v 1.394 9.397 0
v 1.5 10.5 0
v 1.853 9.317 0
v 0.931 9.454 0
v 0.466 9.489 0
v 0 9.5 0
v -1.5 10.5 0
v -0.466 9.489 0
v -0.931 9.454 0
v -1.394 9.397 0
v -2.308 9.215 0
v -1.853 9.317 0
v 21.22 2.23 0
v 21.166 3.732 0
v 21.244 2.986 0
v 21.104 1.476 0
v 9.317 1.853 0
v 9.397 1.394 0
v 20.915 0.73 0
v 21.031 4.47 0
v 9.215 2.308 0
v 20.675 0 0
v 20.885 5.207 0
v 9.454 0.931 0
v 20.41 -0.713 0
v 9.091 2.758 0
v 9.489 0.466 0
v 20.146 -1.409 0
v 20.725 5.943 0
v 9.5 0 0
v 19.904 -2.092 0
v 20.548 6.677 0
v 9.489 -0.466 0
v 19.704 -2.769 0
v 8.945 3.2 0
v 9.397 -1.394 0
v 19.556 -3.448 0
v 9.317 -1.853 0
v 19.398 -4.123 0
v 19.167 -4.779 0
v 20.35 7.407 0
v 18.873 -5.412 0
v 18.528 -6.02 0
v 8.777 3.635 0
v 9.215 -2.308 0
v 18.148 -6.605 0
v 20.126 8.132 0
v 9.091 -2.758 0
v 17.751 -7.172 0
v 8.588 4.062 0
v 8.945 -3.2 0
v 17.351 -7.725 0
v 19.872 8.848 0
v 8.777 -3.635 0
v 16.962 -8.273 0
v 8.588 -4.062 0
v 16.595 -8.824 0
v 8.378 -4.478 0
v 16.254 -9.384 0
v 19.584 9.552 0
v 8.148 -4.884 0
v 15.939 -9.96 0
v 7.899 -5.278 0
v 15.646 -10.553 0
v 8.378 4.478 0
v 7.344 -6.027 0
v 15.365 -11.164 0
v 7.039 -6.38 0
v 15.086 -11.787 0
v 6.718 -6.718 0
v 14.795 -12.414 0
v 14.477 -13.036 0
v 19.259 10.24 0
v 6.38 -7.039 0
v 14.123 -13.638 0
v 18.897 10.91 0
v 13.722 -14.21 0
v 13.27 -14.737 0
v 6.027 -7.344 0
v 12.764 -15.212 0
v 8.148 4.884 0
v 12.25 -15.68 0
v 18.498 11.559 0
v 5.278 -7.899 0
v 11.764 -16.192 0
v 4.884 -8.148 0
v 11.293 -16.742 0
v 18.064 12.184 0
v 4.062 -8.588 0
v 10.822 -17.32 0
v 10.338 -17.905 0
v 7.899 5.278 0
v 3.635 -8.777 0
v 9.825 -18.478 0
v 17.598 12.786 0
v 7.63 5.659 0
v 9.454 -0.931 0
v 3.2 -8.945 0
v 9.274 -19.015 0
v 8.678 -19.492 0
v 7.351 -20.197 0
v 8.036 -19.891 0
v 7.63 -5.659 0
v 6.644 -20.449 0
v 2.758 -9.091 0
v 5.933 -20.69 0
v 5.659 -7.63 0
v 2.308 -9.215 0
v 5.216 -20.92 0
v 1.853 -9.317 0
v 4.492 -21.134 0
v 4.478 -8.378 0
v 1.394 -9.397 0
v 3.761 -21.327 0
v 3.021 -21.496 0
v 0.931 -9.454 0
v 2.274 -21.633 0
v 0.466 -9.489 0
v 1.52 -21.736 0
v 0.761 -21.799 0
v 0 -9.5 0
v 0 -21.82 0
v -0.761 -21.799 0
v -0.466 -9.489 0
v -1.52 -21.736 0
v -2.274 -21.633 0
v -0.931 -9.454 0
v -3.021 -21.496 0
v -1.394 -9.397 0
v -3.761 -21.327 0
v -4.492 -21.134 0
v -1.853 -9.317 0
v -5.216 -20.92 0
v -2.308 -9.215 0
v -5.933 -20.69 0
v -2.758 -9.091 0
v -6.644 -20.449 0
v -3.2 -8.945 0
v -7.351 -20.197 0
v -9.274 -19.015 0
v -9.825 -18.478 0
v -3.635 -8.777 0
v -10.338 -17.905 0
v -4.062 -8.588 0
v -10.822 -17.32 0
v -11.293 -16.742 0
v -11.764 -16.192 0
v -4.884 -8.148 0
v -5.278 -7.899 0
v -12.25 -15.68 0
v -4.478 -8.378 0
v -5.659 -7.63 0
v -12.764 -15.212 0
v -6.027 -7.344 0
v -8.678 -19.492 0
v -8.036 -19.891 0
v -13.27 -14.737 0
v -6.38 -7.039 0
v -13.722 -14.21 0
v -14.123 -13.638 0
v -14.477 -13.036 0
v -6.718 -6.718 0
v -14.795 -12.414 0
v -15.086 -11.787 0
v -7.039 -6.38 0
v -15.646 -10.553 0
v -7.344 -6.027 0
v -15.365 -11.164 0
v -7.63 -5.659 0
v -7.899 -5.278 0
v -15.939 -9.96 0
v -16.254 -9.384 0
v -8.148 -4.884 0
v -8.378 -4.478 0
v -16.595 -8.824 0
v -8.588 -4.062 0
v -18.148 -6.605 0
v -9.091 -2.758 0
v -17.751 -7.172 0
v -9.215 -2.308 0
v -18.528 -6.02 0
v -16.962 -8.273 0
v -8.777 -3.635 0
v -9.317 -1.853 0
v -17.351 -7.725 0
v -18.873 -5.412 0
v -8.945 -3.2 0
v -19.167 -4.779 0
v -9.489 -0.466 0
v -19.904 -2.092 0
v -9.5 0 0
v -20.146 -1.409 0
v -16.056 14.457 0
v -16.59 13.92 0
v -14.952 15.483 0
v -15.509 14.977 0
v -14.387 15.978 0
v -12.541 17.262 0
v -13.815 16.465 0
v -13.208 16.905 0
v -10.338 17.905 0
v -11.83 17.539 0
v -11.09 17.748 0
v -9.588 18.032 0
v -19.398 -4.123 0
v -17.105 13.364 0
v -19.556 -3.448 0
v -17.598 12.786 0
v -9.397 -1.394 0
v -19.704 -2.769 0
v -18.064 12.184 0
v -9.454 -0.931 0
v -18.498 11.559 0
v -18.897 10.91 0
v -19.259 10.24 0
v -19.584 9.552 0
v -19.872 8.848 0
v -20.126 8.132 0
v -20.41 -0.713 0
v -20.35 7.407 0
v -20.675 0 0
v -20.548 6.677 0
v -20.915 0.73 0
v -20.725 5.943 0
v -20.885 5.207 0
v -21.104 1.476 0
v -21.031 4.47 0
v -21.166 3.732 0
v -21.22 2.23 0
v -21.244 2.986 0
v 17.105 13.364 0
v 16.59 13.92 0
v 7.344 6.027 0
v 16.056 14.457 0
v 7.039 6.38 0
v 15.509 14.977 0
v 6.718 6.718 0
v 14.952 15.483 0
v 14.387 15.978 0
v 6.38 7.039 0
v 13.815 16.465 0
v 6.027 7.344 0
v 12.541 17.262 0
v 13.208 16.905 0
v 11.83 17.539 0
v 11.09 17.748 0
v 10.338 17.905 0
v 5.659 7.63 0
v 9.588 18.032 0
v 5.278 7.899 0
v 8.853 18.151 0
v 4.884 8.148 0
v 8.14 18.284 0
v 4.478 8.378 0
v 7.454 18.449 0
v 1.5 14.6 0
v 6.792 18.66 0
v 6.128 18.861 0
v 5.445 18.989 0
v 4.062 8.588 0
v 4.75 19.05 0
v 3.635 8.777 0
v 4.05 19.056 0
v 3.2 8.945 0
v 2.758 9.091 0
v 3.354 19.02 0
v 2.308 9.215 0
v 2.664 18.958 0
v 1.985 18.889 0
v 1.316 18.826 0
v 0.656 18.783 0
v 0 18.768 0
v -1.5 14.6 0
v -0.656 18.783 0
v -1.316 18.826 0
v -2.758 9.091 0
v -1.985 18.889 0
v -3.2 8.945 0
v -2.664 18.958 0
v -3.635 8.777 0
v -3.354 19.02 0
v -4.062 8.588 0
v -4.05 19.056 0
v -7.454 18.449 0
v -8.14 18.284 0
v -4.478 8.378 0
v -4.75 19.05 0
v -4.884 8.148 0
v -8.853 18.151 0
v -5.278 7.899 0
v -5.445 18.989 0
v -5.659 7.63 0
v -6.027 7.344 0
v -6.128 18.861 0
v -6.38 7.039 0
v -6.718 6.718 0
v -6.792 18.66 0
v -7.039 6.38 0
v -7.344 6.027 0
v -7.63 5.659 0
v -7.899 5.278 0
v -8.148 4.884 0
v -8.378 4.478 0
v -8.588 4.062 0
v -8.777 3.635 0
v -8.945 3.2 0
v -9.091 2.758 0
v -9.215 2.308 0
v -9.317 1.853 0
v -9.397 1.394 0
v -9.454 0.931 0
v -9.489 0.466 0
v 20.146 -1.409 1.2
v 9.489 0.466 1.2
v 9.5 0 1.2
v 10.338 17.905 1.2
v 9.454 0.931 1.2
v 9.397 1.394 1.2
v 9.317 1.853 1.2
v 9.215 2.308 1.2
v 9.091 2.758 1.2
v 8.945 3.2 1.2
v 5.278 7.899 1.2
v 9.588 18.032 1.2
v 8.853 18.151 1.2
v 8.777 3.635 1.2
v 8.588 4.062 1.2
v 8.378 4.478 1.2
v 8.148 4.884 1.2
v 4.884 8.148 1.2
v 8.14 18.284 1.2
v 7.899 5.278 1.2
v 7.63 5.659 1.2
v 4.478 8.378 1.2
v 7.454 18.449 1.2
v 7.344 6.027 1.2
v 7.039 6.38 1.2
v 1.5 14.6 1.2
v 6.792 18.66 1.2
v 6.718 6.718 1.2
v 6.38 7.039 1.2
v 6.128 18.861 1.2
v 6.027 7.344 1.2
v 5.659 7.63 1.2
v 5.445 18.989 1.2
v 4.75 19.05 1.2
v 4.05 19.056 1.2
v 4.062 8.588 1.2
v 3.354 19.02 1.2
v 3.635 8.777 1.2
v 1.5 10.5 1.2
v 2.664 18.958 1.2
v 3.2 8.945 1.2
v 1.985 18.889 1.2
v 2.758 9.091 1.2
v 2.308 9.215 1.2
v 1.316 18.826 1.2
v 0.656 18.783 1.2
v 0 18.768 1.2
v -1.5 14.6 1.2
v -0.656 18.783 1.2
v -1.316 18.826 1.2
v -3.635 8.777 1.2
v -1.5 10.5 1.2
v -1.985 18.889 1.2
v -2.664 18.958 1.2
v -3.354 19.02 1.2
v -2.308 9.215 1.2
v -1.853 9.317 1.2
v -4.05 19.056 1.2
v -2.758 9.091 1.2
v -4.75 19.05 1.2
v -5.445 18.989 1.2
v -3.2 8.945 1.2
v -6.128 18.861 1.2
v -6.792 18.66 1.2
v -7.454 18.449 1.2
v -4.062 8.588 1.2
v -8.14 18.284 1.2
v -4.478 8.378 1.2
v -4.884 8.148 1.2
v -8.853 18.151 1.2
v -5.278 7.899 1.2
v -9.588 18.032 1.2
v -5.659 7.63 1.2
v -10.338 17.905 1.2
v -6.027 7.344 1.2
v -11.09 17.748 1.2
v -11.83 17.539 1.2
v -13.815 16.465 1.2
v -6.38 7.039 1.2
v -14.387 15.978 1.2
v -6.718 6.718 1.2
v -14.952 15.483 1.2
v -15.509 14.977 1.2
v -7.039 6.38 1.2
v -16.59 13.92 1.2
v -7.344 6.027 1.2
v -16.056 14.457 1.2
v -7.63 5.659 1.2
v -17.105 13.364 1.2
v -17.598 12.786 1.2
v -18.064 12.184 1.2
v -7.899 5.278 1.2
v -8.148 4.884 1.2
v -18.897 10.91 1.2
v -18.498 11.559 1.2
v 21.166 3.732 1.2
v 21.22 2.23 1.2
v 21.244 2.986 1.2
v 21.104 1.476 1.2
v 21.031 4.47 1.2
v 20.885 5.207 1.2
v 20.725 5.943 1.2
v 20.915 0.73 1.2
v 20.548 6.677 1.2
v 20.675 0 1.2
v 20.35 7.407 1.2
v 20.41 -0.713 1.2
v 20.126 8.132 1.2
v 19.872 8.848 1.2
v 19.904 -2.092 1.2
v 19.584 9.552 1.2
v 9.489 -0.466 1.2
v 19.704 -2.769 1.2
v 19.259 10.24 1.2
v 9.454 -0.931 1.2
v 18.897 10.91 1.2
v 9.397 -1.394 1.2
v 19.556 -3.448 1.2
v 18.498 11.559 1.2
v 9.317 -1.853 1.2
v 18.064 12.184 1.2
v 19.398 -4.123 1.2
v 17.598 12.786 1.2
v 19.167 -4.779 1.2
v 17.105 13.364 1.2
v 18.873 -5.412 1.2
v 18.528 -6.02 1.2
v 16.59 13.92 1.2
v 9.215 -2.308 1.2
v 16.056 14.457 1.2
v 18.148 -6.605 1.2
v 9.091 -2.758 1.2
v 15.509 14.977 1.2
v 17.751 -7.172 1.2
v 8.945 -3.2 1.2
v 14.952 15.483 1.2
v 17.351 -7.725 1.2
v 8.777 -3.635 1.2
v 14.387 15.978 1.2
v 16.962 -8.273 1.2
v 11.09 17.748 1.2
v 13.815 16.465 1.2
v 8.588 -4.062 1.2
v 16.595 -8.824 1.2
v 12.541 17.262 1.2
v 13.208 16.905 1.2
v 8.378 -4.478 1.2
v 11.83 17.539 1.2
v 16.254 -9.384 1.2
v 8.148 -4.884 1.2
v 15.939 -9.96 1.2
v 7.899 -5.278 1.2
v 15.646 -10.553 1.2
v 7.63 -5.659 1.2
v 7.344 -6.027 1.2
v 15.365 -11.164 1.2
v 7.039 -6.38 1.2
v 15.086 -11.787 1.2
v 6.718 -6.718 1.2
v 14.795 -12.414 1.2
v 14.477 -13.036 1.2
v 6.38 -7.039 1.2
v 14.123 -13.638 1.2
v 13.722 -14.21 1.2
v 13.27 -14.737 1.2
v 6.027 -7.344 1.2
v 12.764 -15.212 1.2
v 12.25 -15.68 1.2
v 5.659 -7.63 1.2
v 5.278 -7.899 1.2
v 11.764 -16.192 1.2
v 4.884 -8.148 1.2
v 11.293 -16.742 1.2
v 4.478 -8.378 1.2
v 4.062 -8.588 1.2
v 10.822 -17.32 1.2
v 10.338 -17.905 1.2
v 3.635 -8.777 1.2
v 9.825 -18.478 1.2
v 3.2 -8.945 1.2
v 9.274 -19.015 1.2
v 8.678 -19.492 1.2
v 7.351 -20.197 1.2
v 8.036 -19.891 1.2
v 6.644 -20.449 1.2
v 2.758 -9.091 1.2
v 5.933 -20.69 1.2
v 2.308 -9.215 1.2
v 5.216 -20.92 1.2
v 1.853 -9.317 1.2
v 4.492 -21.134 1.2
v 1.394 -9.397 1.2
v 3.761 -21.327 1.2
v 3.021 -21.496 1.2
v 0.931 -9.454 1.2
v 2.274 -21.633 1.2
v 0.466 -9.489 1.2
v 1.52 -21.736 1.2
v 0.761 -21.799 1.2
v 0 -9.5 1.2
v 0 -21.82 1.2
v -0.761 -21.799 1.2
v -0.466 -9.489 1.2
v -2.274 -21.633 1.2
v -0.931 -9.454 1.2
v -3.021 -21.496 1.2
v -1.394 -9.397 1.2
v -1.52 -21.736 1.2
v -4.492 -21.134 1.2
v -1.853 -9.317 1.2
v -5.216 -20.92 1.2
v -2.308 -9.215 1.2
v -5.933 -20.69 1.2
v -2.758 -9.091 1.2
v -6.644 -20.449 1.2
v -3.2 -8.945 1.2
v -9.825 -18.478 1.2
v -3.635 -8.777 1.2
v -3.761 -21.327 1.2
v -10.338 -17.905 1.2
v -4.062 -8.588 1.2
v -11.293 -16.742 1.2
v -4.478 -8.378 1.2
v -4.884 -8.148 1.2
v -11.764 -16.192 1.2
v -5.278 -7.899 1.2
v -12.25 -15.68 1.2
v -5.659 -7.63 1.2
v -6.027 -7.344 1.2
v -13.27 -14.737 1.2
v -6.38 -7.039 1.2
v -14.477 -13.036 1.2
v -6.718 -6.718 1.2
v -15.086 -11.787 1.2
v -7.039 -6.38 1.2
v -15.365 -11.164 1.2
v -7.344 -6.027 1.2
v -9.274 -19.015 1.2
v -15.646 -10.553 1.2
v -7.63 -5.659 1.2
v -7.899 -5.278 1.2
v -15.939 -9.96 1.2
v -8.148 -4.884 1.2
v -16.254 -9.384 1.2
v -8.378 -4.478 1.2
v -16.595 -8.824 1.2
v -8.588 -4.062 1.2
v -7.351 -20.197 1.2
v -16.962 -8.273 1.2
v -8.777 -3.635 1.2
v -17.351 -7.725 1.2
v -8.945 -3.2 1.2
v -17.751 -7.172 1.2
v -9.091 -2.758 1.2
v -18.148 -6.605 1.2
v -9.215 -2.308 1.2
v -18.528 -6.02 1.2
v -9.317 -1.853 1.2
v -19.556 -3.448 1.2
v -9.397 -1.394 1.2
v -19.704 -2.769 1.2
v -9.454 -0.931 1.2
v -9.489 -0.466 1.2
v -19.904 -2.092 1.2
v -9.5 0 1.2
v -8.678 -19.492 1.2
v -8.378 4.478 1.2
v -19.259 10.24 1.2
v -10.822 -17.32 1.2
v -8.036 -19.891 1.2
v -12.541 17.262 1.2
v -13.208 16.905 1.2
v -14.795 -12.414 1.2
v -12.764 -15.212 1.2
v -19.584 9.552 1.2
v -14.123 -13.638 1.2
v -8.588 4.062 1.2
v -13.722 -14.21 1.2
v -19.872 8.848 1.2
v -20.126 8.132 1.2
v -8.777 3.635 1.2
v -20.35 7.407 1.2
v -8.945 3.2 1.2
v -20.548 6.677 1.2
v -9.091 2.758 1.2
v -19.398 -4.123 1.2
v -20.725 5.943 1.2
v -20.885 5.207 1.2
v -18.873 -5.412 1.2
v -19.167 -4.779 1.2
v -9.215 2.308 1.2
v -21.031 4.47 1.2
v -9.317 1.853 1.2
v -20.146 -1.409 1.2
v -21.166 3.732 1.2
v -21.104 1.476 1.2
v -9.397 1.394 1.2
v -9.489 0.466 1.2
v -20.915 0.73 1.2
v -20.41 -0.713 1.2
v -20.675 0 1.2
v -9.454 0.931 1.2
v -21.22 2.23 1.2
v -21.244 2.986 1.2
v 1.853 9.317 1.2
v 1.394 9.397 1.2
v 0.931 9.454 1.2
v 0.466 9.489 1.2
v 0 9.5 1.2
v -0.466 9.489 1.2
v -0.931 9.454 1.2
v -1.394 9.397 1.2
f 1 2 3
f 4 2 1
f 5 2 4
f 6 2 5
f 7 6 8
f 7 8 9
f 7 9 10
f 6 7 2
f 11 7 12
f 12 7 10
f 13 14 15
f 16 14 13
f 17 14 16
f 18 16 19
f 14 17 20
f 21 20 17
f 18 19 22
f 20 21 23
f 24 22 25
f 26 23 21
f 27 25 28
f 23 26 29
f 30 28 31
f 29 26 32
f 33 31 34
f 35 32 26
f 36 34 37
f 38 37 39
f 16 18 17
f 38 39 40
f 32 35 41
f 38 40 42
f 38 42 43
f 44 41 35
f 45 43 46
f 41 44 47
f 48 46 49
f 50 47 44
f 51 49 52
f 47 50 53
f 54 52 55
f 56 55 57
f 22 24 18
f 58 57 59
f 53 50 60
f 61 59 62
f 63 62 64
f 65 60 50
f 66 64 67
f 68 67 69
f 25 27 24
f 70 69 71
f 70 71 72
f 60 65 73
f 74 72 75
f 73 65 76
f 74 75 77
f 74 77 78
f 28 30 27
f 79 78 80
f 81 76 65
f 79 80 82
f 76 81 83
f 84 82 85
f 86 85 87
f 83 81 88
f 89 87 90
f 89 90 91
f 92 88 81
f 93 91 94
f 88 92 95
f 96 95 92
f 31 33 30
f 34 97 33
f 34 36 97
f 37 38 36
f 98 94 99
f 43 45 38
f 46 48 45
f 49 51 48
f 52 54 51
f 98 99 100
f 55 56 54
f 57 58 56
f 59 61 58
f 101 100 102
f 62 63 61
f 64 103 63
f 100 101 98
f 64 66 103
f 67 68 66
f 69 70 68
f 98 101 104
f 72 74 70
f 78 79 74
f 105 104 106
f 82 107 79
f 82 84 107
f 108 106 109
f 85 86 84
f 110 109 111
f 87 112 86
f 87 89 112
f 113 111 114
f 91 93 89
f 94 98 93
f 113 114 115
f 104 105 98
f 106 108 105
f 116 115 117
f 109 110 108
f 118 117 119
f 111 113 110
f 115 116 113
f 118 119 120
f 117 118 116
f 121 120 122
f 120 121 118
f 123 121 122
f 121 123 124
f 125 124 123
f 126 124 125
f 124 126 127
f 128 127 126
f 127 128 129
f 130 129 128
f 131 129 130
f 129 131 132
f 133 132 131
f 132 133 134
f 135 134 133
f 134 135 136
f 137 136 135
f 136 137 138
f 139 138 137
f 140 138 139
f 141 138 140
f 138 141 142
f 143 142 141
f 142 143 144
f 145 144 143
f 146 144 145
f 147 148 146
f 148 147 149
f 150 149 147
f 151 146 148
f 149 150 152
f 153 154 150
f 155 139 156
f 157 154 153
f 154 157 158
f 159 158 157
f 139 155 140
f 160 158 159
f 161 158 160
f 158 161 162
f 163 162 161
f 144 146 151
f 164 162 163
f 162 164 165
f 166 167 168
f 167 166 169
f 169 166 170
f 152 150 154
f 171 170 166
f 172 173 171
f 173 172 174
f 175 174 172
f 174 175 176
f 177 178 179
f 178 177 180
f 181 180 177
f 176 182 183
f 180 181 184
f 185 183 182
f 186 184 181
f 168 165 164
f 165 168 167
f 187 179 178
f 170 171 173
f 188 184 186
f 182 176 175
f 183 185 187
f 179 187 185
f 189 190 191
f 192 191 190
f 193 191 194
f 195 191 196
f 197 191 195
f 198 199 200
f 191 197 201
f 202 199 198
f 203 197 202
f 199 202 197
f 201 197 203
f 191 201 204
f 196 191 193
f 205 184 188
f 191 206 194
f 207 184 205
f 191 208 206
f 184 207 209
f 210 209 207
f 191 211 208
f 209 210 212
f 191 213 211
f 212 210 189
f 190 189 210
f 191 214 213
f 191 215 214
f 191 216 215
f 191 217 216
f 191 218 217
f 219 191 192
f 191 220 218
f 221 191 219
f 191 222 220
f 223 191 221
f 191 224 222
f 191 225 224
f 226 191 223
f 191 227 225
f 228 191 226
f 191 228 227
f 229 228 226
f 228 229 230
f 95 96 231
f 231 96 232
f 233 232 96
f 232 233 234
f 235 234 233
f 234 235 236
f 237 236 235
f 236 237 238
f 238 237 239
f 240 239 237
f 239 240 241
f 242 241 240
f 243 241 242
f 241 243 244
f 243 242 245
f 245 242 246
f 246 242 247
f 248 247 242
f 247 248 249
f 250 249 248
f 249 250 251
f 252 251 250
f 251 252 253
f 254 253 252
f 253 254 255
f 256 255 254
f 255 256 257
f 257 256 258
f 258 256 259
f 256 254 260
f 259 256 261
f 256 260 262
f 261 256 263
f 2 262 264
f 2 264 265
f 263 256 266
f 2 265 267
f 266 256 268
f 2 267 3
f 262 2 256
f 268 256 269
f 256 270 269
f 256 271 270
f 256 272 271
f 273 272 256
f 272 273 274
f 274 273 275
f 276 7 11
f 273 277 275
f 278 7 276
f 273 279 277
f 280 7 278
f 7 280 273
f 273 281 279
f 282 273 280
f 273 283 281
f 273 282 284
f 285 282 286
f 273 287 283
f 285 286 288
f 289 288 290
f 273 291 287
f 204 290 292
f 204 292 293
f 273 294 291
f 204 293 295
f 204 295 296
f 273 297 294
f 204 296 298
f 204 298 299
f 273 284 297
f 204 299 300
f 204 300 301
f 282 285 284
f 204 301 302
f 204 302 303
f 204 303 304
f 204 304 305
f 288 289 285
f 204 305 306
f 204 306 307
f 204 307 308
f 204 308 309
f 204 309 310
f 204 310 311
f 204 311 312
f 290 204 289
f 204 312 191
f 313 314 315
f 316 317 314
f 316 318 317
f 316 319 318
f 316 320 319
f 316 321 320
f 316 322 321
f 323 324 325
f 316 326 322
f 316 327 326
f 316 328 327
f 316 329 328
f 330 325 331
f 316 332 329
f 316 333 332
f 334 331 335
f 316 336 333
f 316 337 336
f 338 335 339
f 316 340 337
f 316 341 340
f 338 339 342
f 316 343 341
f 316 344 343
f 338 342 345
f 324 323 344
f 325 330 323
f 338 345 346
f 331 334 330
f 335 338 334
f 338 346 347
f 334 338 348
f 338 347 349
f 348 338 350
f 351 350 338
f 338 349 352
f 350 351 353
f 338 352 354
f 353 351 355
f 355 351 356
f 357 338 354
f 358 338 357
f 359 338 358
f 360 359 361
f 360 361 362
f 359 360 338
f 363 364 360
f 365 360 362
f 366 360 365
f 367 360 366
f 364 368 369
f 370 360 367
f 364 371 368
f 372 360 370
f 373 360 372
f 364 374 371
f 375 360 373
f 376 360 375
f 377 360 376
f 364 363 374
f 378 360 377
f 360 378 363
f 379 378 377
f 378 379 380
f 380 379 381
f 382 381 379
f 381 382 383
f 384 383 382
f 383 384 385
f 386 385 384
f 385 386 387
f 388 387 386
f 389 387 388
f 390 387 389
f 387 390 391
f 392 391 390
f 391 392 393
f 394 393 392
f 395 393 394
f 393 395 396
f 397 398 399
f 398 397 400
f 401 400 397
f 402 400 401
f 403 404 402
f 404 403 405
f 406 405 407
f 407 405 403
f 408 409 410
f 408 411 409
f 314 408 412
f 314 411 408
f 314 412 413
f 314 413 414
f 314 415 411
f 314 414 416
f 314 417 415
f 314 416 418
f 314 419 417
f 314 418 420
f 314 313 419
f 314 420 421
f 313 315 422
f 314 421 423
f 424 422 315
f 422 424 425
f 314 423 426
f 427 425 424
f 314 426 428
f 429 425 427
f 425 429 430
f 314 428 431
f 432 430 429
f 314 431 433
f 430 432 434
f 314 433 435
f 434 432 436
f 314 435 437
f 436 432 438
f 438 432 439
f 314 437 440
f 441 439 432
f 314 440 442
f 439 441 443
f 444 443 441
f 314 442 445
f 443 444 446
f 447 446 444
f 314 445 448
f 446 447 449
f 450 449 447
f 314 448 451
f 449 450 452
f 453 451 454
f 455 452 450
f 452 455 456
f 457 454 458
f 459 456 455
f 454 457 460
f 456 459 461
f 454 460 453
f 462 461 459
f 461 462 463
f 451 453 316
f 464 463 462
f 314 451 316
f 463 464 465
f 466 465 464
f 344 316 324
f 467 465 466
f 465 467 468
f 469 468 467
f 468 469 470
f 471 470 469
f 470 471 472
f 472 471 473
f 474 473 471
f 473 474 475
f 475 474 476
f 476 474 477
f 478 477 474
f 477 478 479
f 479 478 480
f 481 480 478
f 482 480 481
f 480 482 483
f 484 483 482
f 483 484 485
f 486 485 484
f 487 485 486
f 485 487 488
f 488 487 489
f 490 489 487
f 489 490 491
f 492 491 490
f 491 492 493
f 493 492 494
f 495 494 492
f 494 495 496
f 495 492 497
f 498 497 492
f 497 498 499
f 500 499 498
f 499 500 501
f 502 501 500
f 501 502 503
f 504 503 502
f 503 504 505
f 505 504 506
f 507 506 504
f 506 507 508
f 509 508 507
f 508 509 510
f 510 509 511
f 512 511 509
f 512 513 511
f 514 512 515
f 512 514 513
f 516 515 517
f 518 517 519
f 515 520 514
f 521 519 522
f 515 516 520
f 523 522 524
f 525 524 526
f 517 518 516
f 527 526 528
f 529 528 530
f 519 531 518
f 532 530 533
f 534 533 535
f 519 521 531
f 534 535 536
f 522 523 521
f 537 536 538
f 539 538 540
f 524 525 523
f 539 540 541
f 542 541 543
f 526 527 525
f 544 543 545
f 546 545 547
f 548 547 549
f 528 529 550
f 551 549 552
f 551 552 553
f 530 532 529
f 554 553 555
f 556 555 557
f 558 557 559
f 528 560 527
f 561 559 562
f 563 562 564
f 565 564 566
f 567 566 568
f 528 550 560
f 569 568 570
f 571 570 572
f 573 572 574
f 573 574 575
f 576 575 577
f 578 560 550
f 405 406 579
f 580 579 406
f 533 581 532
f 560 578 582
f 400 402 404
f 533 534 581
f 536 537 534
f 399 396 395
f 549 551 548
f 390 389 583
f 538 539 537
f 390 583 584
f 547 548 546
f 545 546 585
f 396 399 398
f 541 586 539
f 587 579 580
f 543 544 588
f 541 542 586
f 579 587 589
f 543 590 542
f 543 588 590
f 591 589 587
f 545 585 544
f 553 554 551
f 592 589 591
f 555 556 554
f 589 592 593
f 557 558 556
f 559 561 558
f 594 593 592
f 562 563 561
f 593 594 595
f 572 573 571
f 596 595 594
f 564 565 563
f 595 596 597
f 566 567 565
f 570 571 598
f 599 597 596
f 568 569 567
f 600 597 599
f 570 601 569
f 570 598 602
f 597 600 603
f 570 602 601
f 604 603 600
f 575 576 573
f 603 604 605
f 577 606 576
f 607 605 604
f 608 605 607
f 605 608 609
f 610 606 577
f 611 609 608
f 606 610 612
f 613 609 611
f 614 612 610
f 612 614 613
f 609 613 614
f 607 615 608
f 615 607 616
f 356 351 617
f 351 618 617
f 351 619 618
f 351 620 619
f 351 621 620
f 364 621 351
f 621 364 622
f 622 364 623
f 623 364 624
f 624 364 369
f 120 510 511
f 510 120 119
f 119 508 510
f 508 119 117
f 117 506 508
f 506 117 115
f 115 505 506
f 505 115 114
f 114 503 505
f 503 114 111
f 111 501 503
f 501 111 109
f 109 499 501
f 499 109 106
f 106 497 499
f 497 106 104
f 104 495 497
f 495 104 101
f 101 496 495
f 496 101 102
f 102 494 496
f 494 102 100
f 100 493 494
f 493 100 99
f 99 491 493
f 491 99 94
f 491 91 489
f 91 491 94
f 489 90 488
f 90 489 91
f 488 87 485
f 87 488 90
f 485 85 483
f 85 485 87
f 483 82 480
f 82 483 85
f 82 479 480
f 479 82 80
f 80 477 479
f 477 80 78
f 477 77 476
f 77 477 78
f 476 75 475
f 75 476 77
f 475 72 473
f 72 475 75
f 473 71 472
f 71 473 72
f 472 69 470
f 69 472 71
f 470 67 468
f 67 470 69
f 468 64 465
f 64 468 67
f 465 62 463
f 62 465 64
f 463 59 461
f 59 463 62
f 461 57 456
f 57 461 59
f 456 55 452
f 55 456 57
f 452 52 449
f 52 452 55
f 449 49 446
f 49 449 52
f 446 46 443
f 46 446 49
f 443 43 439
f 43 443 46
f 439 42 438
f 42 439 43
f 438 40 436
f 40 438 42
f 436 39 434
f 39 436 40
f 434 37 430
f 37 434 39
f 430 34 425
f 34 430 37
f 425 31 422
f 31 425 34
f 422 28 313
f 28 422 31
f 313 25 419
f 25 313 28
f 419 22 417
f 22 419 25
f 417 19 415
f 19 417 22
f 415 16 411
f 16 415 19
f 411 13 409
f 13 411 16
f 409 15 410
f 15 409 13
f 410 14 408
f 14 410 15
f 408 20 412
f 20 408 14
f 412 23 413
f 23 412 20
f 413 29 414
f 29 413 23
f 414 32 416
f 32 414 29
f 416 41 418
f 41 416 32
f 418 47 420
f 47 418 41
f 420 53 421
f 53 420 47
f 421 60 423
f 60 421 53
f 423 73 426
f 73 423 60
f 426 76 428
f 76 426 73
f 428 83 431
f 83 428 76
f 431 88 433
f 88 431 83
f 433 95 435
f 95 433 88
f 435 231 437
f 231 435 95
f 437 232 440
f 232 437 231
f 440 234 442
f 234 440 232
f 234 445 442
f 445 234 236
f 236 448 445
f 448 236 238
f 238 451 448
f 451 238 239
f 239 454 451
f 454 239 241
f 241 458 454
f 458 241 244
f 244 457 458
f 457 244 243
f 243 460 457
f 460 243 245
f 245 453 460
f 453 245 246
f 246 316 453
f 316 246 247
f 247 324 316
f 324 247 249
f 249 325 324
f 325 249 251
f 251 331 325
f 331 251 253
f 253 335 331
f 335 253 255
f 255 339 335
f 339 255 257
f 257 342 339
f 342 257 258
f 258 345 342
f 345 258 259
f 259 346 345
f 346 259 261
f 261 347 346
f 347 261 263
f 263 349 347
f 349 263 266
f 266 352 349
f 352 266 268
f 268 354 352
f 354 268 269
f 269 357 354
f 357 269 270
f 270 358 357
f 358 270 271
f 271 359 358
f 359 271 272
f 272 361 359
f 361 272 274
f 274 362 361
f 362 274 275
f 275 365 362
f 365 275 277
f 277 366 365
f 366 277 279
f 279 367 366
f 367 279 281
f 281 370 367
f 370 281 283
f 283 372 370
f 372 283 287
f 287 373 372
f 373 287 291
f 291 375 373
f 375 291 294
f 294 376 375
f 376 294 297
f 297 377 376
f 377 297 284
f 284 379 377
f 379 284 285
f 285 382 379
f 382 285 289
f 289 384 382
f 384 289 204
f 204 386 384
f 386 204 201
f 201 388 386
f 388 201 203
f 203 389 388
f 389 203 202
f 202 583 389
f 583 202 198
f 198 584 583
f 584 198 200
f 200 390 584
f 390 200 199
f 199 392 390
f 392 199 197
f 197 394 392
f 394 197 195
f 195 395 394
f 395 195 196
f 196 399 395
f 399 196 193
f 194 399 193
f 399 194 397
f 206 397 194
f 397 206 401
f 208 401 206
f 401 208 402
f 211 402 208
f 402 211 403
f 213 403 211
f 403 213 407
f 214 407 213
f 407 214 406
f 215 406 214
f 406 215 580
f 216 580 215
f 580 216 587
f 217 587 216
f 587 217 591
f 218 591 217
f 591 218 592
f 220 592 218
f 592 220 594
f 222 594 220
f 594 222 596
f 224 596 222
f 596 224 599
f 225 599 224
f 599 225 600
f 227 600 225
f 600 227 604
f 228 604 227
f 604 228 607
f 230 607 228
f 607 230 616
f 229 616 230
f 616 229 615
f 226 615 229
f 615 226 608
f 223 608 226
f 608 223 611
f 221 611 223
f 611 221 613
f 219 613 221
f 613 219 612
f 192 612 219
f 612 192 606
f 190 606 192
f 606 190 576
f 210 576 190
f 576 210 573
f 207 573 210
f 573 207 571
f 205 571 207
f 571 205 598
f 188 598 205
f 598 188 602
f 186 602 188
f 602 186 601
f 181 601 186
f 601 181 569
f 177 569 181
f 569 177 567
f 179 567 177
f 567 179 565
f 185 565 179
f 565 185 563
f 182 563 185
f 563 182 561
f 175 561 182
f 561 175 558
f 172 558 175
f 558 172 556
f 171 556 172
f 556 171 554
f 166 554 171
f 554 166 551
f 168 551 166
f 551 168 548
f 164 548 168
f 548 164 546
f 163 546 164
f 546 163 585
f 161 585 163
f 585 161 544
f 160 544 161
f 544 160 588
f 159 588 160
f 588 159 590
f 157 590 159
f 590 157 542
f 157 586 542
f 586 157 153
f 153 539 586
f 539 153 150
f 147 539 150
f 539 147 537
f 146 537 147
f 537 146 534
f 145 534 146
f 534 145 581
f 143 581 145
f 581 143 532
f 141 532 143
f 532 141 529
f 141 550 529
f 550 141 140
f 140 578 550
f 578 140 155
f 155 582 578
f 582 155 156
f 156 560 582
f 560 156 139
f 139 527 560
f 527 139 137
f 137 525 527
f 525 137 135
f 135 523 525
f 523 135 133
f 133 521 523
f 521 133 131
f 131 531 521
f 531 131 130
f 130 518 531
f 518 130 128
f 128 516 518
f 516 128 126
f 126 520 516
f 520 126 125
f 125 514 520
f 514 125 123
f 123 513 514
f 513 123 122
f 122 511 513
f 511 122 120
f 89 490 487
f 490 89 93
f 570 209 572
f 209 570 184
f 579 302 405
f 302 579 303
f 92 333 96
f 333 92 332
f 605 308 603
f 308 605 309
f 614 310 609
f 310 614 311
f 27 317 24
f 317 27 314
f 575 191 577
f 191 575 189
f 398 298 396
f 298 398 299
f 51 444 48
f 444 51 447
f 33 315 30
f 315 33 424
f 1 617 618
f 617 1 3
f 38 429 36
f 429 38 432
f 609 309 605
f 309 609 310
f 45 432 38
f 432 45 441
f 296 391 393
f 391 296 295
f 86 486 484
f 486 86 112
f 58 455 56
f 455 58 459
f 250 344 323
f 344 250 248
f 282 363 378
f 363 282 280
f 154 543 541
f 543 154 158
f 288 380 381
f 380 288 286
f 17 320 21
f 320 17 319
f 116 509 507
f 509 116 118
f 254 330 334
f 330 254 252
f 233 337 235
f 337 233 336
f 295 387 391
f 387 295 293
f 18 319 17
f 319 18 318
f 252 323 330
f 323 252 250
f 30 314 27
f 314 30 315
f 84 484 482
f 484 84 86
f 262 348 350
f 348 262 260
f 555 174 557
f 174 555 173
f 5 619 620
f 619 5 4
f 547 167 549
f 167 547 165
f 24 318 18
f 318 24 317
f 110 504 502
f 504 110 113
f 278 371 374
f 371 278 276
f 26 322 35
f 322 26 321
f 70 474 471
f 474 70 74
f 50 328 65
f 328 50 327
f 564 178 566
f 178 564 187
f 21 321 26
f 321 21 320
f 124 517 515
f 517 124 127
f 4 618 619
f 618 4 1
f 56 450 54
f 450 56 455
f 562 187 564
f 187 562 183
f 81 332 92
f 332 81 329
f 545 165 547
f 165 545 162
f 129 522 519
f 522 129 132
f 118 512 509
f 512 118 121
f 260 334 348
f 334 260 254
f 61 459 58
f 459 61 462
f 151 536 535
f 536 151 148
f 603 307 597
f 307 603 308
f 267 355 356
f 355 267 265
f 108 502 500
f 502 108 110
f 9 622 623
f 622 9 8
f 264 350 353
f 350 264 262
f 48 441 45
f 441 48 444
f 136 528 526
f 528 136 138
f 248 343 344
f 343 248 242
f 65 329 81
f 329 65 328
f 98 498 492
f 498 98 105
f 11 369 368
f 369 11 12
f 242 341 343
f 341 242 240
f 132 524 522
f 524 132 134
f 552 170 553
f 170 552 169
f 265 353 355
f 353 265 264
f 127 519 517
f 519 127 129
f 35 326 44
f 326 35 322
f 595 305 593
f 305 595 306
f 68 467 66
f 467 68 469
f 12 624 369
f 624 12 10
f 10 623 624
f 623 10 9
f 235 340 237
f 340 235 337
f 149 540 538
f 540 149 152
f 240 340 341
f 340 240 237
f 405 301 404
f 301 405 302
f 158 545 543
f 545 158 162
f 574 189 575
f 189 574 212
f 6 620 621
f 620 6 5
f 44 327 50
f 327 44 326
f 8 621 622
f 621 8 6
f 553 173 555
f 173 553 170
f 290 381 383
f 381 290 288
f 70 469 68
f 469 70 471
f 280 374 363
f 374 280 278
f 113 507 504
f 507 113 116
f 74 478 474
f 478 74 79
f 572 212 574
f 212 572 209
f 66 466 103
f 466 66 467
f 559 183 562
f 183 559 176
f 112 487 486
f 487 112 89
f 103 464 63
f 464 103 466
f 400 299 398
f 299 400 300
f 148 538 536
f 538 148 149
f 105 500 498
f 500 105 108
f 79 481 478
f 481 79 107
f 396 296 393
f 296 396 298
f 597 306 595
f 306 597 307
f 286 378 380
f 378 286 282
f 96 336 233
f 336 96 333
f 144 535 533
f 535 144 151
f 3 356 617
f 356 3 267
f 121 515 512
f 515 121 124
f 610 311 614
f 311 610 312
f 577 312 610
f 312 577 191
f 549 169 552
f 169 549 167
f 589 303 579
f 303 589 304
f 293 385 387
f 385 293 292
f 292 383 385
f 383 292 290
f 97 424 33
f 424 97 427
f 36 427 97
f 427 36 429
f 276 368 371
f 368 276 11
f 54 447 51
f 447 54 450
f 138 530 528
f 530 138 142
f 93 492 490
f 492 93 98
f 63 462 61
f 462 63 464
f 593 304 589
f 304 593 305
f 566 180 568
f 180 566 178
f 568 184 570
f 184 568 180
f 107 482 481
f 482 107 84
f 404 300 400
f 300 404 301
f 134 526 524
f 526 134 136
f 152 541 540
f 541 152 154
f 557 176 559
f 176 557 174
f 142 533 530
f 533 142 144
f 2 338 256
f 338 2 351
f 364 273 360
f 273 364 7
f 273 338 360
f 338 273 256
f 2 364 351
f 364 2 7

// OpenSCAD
/*
  Elna Supermatic cam 24
  Name: Small scallop
  Status: candidate

  Generated from measured parametric base v2.
  Surface mode: smooth
*/

include <_elna_measured_common.scad>;

profile_points = [
        [0.0000, 18.7680],
        [0.6559, 18.7832],
        [1.3165, 18.8261],
        [1.9853, 18.8886],
        [2.6644, 18.9583],
        [3.3537, 19.0196],
        [4.0504, 19.0557],
        [4.7497, 19.0501],
        [5.4449, 18.9887],
        [6.1282, 18.8607],
        [6.7918, 18.6604],
        [7.4539, 18.4491],
        [8.1405, 18.2838],
        [8.8529, 18.1511],
        [9.5880, 18.0323],
        [10.3377, 17.9055],
        [11.0902, 17.7481],
        [11.8303, 17.5391],
        [12.5415, 17.2619],
        [13.2078, 16.9052],
        [13.8154, 16.4646],
        [14.3870, 15.9784],
        [14.9520, 15.4832],
        [15.5093, 14.9771],
        [16.0564, 14.4572],
        [16.5898, 13.9205],
        [17.1054, 13.3642],
        [17.5982, 12.7859],
        [18.0637, 12.1841],
        [18.4976, 11.5586],
        [18.8967, 10.9100],
        [19.2589, 10.2401],
        [19.5836, 9.5516],
        [19.8720, 8.8476],
        [20.1264, 8.1316],
        [20.3505, 7.4070],
        [20.5485, 6.6766],
        [20.7252, 5.9429],
        [20.8849, 5.2072],
        [21.0312, 4.4703],
        [21.1665, 3.7322],
        [21.2442, 2.9857],
        [21.2200, 2.2303],
        [21.1045, 1.4758],
        [20.9154, 0.7304],
        [20.6755, 0.0000],
        [20.4104, -0.7127],
        [20.1458, -1.4087],
        [19.9045, -2.0920],
        [19.7044, -2.7693],
        [19.5563, -3.4483],
        [19.3980, -4.1232],
        [19.1671, -4.7789],
        [18.8728, -5.4117],
        [18.5279, -6.0201],
        [18.1483, -6.6054],
        [17.7506, -7.1717],
        [17.3507, -7.7250],
        [16.9621, -8.2730],
        [16.5947, -8.8236],
        [16.2536, -9.3840],
        [15.9388, -9.9597],
        [15.6457, -10.5531],
        [15.3654, -11.1636],
        [15.0861, -11.7866],
        [14.7946, -12.4142],
        [14.4775, -13.0356],
        [14.1230, -13.6385],
        [13.7222, -14.2098],
        [13.2697, -14.7375],
        [12.7645, -15.2121],
        [12.2504, -15.6798],
        [11.7640, -16.1918],
        [11.2929, -16.7424],
        [10.8225, -17.3196],
        [10.3377, -17.9055],
        [9.8252, -18.4784],
        [9.2742, -19.0149],
        [8.6785, -19.4922],
        [8.0364, -19.8909],
        [7.3510, -20.1968],
        [6.6442, -20.4487],
        [5.9329, -20.6904],
        [5.2159, -20.9200],
        [4.4921, -21.1338],
        [3.7606, -21.3275],
        [3.0210, -21.4958],
        [2.2738, -21.6334],
        [1.5199, -21.7357],
        [0.7612, -21.7987],
        [0.0000, -21.8200],
        [-0.7612, -21.7987],
        [-1.5199, -21.7357],
        [-2.2738, -21.6334],
        [-3.0210, -21.4958],
        [-3.7606, -21.3275],
        [-4.4921, -21.1338],
        [-5.2159, -20.9200],
        [-5.9329, -20.6904],
        [-6.6442, -20.4487],
        [-7.3510, -20.1968],
        [-8.0364, -19.8909],
        [-8.6785, -19.4922],
        [-9.2742, -19.0149],
        [-9.8252, -18.4784],
        [-10.3378, -17.9055],
        [-10.8225, -17.3196],
        [-11.2929, -16.7424],
        [-11.7640, -16.1918],
        [-12.2504, -15.6798],
        [-12.7645, -15.2121],
        [-13.2697, -14.7375],
        [-13.7222, -14.2098],
        [-14.1230, -13.6385],
        [-14.4775, -13.0356],
        [-14.7946, -12.4142],
        [-15.0861, -11.7866],
        [-15.3654, -11.1636],
        [-15.6457, -10.5531],
        [-15.9388, -9.9597],
        [-16.2536, -9.3840],
        [-16.5947, -8.8236],
        [-16.9621, -8.2730],
        [-17.3507, -7.7250],
        [-17.7506, -7.1717],
        [-18.1483, -6.6054],
        [-18.5279, -6.0201],
        [-18.8728, -5.4117],
        [-19.1671, -4.7789],
        [-19.3980, -4.1232],
        [-19.5563, -3.4483],
        [-19.7044, -2.7693],
        [-19.9045, -2.0920],
        [-20.1458, -1.4087],
        [-20.4104, -0.7127],
        [-20.6755, -0.0000],
        [-20.9154, 0.7304],
        [-21.1045, 1.4758],
        [-21.2200, 2.2303],
        [-21.2442, 2.9857],
        [-21.1665, 3.7322],
        [-21.0312, 4.4703],
        [-20.8849, 5.2072],
        [-20.7252, 5.9429],
        [-20.5485, 6.6766],
        [-20.3505, 7.4070],
        [-20.1264, 8.1316],
        [-19.8720, 8.8476],
        [-19.5836, 9.5516],
        [-19.2589, 10.2401],
        [-18.8967, 10.9100],
        [-18.4976, 11.5586],
        [-18.0637, 12.1841],
        [-17.5982, 12.7859],
        [-17.1054, 13.3642],
        [-16.5898, 13.9205],
        [-16.0564, 14.4572],
        [-15.5093, 14.9771],
        [-14.9520, 15.4832],
        [-14.3870, 15.9784],
        [-13.8154, 16.4646],
        [-13.2078, 16.9052],
        [-12.5415, 17.2619],
        [-11.8303, 17.5391],
        [-11.0902, 17.7481],
        [-10.3378, 17.9055],
        [-9.5880, 18.0323],
        [-8.8529, 18.1511],
        [-8.1405, 18.2838],
        [-7.4539, 18.4491],
        [-6.7918, 18.6604],
        [-6.1282, 18.8607],
        [-5.4449, 18.9887],
        [-4.7497, 19.0501],
        [-4.0504, 19.0557],
        [-3.3537, 19.0196],
        [-2.6644, 18.9583],
        [-1.9853, 18.8886],
        [-1.3165, 18.8261],
        [-0.6559, 18.7832]
];

icon_points = [[-1.000,0.100], [-0.959,0.257], [-0.918,0.408], [-0.878,0.547], [-0.837,0.670], [-0.796,0.773], [-0.755,0.850], [-0.714,0.899], [-0.673,0.920], [-0.633,0.909], [-0.592,0.870], [-0.551,0.801], [-0.510,0.707], [-0.469,0.590], [-0.429,0.456], [-0.388,0.308], [-0.347,0.153], [-0.306,0.205], [-0.265,0.358], [-0.224,0.502], [-0.184,0.632], [-0.143,0.741], [-0.102,0.827], [-0.061,0.886], [-0.020,0.916], [0.020,0.916], [0.061,0.886], [0.102,0.827], [0.143,0.741], [0.184,0.632], [0.224,0.502], [0.265,0.358], [0.306,0.205], [0.347,0.153], [0.388,0.308], [0.429,0.456], [0.469,0.590], [0.510,0.707], [0.551,0.801], [0.592,0.870], [0.633,0.909], [0.673,0.920], [0.714,0.899], [0.755,0.850], [0.796,0.773], [0.837,0.670], [0.878,0.547], [0.918,0.408], [0.959,0.257], [1.000,0.100]];

elna_cam_ring(profile_points=profile_points);
